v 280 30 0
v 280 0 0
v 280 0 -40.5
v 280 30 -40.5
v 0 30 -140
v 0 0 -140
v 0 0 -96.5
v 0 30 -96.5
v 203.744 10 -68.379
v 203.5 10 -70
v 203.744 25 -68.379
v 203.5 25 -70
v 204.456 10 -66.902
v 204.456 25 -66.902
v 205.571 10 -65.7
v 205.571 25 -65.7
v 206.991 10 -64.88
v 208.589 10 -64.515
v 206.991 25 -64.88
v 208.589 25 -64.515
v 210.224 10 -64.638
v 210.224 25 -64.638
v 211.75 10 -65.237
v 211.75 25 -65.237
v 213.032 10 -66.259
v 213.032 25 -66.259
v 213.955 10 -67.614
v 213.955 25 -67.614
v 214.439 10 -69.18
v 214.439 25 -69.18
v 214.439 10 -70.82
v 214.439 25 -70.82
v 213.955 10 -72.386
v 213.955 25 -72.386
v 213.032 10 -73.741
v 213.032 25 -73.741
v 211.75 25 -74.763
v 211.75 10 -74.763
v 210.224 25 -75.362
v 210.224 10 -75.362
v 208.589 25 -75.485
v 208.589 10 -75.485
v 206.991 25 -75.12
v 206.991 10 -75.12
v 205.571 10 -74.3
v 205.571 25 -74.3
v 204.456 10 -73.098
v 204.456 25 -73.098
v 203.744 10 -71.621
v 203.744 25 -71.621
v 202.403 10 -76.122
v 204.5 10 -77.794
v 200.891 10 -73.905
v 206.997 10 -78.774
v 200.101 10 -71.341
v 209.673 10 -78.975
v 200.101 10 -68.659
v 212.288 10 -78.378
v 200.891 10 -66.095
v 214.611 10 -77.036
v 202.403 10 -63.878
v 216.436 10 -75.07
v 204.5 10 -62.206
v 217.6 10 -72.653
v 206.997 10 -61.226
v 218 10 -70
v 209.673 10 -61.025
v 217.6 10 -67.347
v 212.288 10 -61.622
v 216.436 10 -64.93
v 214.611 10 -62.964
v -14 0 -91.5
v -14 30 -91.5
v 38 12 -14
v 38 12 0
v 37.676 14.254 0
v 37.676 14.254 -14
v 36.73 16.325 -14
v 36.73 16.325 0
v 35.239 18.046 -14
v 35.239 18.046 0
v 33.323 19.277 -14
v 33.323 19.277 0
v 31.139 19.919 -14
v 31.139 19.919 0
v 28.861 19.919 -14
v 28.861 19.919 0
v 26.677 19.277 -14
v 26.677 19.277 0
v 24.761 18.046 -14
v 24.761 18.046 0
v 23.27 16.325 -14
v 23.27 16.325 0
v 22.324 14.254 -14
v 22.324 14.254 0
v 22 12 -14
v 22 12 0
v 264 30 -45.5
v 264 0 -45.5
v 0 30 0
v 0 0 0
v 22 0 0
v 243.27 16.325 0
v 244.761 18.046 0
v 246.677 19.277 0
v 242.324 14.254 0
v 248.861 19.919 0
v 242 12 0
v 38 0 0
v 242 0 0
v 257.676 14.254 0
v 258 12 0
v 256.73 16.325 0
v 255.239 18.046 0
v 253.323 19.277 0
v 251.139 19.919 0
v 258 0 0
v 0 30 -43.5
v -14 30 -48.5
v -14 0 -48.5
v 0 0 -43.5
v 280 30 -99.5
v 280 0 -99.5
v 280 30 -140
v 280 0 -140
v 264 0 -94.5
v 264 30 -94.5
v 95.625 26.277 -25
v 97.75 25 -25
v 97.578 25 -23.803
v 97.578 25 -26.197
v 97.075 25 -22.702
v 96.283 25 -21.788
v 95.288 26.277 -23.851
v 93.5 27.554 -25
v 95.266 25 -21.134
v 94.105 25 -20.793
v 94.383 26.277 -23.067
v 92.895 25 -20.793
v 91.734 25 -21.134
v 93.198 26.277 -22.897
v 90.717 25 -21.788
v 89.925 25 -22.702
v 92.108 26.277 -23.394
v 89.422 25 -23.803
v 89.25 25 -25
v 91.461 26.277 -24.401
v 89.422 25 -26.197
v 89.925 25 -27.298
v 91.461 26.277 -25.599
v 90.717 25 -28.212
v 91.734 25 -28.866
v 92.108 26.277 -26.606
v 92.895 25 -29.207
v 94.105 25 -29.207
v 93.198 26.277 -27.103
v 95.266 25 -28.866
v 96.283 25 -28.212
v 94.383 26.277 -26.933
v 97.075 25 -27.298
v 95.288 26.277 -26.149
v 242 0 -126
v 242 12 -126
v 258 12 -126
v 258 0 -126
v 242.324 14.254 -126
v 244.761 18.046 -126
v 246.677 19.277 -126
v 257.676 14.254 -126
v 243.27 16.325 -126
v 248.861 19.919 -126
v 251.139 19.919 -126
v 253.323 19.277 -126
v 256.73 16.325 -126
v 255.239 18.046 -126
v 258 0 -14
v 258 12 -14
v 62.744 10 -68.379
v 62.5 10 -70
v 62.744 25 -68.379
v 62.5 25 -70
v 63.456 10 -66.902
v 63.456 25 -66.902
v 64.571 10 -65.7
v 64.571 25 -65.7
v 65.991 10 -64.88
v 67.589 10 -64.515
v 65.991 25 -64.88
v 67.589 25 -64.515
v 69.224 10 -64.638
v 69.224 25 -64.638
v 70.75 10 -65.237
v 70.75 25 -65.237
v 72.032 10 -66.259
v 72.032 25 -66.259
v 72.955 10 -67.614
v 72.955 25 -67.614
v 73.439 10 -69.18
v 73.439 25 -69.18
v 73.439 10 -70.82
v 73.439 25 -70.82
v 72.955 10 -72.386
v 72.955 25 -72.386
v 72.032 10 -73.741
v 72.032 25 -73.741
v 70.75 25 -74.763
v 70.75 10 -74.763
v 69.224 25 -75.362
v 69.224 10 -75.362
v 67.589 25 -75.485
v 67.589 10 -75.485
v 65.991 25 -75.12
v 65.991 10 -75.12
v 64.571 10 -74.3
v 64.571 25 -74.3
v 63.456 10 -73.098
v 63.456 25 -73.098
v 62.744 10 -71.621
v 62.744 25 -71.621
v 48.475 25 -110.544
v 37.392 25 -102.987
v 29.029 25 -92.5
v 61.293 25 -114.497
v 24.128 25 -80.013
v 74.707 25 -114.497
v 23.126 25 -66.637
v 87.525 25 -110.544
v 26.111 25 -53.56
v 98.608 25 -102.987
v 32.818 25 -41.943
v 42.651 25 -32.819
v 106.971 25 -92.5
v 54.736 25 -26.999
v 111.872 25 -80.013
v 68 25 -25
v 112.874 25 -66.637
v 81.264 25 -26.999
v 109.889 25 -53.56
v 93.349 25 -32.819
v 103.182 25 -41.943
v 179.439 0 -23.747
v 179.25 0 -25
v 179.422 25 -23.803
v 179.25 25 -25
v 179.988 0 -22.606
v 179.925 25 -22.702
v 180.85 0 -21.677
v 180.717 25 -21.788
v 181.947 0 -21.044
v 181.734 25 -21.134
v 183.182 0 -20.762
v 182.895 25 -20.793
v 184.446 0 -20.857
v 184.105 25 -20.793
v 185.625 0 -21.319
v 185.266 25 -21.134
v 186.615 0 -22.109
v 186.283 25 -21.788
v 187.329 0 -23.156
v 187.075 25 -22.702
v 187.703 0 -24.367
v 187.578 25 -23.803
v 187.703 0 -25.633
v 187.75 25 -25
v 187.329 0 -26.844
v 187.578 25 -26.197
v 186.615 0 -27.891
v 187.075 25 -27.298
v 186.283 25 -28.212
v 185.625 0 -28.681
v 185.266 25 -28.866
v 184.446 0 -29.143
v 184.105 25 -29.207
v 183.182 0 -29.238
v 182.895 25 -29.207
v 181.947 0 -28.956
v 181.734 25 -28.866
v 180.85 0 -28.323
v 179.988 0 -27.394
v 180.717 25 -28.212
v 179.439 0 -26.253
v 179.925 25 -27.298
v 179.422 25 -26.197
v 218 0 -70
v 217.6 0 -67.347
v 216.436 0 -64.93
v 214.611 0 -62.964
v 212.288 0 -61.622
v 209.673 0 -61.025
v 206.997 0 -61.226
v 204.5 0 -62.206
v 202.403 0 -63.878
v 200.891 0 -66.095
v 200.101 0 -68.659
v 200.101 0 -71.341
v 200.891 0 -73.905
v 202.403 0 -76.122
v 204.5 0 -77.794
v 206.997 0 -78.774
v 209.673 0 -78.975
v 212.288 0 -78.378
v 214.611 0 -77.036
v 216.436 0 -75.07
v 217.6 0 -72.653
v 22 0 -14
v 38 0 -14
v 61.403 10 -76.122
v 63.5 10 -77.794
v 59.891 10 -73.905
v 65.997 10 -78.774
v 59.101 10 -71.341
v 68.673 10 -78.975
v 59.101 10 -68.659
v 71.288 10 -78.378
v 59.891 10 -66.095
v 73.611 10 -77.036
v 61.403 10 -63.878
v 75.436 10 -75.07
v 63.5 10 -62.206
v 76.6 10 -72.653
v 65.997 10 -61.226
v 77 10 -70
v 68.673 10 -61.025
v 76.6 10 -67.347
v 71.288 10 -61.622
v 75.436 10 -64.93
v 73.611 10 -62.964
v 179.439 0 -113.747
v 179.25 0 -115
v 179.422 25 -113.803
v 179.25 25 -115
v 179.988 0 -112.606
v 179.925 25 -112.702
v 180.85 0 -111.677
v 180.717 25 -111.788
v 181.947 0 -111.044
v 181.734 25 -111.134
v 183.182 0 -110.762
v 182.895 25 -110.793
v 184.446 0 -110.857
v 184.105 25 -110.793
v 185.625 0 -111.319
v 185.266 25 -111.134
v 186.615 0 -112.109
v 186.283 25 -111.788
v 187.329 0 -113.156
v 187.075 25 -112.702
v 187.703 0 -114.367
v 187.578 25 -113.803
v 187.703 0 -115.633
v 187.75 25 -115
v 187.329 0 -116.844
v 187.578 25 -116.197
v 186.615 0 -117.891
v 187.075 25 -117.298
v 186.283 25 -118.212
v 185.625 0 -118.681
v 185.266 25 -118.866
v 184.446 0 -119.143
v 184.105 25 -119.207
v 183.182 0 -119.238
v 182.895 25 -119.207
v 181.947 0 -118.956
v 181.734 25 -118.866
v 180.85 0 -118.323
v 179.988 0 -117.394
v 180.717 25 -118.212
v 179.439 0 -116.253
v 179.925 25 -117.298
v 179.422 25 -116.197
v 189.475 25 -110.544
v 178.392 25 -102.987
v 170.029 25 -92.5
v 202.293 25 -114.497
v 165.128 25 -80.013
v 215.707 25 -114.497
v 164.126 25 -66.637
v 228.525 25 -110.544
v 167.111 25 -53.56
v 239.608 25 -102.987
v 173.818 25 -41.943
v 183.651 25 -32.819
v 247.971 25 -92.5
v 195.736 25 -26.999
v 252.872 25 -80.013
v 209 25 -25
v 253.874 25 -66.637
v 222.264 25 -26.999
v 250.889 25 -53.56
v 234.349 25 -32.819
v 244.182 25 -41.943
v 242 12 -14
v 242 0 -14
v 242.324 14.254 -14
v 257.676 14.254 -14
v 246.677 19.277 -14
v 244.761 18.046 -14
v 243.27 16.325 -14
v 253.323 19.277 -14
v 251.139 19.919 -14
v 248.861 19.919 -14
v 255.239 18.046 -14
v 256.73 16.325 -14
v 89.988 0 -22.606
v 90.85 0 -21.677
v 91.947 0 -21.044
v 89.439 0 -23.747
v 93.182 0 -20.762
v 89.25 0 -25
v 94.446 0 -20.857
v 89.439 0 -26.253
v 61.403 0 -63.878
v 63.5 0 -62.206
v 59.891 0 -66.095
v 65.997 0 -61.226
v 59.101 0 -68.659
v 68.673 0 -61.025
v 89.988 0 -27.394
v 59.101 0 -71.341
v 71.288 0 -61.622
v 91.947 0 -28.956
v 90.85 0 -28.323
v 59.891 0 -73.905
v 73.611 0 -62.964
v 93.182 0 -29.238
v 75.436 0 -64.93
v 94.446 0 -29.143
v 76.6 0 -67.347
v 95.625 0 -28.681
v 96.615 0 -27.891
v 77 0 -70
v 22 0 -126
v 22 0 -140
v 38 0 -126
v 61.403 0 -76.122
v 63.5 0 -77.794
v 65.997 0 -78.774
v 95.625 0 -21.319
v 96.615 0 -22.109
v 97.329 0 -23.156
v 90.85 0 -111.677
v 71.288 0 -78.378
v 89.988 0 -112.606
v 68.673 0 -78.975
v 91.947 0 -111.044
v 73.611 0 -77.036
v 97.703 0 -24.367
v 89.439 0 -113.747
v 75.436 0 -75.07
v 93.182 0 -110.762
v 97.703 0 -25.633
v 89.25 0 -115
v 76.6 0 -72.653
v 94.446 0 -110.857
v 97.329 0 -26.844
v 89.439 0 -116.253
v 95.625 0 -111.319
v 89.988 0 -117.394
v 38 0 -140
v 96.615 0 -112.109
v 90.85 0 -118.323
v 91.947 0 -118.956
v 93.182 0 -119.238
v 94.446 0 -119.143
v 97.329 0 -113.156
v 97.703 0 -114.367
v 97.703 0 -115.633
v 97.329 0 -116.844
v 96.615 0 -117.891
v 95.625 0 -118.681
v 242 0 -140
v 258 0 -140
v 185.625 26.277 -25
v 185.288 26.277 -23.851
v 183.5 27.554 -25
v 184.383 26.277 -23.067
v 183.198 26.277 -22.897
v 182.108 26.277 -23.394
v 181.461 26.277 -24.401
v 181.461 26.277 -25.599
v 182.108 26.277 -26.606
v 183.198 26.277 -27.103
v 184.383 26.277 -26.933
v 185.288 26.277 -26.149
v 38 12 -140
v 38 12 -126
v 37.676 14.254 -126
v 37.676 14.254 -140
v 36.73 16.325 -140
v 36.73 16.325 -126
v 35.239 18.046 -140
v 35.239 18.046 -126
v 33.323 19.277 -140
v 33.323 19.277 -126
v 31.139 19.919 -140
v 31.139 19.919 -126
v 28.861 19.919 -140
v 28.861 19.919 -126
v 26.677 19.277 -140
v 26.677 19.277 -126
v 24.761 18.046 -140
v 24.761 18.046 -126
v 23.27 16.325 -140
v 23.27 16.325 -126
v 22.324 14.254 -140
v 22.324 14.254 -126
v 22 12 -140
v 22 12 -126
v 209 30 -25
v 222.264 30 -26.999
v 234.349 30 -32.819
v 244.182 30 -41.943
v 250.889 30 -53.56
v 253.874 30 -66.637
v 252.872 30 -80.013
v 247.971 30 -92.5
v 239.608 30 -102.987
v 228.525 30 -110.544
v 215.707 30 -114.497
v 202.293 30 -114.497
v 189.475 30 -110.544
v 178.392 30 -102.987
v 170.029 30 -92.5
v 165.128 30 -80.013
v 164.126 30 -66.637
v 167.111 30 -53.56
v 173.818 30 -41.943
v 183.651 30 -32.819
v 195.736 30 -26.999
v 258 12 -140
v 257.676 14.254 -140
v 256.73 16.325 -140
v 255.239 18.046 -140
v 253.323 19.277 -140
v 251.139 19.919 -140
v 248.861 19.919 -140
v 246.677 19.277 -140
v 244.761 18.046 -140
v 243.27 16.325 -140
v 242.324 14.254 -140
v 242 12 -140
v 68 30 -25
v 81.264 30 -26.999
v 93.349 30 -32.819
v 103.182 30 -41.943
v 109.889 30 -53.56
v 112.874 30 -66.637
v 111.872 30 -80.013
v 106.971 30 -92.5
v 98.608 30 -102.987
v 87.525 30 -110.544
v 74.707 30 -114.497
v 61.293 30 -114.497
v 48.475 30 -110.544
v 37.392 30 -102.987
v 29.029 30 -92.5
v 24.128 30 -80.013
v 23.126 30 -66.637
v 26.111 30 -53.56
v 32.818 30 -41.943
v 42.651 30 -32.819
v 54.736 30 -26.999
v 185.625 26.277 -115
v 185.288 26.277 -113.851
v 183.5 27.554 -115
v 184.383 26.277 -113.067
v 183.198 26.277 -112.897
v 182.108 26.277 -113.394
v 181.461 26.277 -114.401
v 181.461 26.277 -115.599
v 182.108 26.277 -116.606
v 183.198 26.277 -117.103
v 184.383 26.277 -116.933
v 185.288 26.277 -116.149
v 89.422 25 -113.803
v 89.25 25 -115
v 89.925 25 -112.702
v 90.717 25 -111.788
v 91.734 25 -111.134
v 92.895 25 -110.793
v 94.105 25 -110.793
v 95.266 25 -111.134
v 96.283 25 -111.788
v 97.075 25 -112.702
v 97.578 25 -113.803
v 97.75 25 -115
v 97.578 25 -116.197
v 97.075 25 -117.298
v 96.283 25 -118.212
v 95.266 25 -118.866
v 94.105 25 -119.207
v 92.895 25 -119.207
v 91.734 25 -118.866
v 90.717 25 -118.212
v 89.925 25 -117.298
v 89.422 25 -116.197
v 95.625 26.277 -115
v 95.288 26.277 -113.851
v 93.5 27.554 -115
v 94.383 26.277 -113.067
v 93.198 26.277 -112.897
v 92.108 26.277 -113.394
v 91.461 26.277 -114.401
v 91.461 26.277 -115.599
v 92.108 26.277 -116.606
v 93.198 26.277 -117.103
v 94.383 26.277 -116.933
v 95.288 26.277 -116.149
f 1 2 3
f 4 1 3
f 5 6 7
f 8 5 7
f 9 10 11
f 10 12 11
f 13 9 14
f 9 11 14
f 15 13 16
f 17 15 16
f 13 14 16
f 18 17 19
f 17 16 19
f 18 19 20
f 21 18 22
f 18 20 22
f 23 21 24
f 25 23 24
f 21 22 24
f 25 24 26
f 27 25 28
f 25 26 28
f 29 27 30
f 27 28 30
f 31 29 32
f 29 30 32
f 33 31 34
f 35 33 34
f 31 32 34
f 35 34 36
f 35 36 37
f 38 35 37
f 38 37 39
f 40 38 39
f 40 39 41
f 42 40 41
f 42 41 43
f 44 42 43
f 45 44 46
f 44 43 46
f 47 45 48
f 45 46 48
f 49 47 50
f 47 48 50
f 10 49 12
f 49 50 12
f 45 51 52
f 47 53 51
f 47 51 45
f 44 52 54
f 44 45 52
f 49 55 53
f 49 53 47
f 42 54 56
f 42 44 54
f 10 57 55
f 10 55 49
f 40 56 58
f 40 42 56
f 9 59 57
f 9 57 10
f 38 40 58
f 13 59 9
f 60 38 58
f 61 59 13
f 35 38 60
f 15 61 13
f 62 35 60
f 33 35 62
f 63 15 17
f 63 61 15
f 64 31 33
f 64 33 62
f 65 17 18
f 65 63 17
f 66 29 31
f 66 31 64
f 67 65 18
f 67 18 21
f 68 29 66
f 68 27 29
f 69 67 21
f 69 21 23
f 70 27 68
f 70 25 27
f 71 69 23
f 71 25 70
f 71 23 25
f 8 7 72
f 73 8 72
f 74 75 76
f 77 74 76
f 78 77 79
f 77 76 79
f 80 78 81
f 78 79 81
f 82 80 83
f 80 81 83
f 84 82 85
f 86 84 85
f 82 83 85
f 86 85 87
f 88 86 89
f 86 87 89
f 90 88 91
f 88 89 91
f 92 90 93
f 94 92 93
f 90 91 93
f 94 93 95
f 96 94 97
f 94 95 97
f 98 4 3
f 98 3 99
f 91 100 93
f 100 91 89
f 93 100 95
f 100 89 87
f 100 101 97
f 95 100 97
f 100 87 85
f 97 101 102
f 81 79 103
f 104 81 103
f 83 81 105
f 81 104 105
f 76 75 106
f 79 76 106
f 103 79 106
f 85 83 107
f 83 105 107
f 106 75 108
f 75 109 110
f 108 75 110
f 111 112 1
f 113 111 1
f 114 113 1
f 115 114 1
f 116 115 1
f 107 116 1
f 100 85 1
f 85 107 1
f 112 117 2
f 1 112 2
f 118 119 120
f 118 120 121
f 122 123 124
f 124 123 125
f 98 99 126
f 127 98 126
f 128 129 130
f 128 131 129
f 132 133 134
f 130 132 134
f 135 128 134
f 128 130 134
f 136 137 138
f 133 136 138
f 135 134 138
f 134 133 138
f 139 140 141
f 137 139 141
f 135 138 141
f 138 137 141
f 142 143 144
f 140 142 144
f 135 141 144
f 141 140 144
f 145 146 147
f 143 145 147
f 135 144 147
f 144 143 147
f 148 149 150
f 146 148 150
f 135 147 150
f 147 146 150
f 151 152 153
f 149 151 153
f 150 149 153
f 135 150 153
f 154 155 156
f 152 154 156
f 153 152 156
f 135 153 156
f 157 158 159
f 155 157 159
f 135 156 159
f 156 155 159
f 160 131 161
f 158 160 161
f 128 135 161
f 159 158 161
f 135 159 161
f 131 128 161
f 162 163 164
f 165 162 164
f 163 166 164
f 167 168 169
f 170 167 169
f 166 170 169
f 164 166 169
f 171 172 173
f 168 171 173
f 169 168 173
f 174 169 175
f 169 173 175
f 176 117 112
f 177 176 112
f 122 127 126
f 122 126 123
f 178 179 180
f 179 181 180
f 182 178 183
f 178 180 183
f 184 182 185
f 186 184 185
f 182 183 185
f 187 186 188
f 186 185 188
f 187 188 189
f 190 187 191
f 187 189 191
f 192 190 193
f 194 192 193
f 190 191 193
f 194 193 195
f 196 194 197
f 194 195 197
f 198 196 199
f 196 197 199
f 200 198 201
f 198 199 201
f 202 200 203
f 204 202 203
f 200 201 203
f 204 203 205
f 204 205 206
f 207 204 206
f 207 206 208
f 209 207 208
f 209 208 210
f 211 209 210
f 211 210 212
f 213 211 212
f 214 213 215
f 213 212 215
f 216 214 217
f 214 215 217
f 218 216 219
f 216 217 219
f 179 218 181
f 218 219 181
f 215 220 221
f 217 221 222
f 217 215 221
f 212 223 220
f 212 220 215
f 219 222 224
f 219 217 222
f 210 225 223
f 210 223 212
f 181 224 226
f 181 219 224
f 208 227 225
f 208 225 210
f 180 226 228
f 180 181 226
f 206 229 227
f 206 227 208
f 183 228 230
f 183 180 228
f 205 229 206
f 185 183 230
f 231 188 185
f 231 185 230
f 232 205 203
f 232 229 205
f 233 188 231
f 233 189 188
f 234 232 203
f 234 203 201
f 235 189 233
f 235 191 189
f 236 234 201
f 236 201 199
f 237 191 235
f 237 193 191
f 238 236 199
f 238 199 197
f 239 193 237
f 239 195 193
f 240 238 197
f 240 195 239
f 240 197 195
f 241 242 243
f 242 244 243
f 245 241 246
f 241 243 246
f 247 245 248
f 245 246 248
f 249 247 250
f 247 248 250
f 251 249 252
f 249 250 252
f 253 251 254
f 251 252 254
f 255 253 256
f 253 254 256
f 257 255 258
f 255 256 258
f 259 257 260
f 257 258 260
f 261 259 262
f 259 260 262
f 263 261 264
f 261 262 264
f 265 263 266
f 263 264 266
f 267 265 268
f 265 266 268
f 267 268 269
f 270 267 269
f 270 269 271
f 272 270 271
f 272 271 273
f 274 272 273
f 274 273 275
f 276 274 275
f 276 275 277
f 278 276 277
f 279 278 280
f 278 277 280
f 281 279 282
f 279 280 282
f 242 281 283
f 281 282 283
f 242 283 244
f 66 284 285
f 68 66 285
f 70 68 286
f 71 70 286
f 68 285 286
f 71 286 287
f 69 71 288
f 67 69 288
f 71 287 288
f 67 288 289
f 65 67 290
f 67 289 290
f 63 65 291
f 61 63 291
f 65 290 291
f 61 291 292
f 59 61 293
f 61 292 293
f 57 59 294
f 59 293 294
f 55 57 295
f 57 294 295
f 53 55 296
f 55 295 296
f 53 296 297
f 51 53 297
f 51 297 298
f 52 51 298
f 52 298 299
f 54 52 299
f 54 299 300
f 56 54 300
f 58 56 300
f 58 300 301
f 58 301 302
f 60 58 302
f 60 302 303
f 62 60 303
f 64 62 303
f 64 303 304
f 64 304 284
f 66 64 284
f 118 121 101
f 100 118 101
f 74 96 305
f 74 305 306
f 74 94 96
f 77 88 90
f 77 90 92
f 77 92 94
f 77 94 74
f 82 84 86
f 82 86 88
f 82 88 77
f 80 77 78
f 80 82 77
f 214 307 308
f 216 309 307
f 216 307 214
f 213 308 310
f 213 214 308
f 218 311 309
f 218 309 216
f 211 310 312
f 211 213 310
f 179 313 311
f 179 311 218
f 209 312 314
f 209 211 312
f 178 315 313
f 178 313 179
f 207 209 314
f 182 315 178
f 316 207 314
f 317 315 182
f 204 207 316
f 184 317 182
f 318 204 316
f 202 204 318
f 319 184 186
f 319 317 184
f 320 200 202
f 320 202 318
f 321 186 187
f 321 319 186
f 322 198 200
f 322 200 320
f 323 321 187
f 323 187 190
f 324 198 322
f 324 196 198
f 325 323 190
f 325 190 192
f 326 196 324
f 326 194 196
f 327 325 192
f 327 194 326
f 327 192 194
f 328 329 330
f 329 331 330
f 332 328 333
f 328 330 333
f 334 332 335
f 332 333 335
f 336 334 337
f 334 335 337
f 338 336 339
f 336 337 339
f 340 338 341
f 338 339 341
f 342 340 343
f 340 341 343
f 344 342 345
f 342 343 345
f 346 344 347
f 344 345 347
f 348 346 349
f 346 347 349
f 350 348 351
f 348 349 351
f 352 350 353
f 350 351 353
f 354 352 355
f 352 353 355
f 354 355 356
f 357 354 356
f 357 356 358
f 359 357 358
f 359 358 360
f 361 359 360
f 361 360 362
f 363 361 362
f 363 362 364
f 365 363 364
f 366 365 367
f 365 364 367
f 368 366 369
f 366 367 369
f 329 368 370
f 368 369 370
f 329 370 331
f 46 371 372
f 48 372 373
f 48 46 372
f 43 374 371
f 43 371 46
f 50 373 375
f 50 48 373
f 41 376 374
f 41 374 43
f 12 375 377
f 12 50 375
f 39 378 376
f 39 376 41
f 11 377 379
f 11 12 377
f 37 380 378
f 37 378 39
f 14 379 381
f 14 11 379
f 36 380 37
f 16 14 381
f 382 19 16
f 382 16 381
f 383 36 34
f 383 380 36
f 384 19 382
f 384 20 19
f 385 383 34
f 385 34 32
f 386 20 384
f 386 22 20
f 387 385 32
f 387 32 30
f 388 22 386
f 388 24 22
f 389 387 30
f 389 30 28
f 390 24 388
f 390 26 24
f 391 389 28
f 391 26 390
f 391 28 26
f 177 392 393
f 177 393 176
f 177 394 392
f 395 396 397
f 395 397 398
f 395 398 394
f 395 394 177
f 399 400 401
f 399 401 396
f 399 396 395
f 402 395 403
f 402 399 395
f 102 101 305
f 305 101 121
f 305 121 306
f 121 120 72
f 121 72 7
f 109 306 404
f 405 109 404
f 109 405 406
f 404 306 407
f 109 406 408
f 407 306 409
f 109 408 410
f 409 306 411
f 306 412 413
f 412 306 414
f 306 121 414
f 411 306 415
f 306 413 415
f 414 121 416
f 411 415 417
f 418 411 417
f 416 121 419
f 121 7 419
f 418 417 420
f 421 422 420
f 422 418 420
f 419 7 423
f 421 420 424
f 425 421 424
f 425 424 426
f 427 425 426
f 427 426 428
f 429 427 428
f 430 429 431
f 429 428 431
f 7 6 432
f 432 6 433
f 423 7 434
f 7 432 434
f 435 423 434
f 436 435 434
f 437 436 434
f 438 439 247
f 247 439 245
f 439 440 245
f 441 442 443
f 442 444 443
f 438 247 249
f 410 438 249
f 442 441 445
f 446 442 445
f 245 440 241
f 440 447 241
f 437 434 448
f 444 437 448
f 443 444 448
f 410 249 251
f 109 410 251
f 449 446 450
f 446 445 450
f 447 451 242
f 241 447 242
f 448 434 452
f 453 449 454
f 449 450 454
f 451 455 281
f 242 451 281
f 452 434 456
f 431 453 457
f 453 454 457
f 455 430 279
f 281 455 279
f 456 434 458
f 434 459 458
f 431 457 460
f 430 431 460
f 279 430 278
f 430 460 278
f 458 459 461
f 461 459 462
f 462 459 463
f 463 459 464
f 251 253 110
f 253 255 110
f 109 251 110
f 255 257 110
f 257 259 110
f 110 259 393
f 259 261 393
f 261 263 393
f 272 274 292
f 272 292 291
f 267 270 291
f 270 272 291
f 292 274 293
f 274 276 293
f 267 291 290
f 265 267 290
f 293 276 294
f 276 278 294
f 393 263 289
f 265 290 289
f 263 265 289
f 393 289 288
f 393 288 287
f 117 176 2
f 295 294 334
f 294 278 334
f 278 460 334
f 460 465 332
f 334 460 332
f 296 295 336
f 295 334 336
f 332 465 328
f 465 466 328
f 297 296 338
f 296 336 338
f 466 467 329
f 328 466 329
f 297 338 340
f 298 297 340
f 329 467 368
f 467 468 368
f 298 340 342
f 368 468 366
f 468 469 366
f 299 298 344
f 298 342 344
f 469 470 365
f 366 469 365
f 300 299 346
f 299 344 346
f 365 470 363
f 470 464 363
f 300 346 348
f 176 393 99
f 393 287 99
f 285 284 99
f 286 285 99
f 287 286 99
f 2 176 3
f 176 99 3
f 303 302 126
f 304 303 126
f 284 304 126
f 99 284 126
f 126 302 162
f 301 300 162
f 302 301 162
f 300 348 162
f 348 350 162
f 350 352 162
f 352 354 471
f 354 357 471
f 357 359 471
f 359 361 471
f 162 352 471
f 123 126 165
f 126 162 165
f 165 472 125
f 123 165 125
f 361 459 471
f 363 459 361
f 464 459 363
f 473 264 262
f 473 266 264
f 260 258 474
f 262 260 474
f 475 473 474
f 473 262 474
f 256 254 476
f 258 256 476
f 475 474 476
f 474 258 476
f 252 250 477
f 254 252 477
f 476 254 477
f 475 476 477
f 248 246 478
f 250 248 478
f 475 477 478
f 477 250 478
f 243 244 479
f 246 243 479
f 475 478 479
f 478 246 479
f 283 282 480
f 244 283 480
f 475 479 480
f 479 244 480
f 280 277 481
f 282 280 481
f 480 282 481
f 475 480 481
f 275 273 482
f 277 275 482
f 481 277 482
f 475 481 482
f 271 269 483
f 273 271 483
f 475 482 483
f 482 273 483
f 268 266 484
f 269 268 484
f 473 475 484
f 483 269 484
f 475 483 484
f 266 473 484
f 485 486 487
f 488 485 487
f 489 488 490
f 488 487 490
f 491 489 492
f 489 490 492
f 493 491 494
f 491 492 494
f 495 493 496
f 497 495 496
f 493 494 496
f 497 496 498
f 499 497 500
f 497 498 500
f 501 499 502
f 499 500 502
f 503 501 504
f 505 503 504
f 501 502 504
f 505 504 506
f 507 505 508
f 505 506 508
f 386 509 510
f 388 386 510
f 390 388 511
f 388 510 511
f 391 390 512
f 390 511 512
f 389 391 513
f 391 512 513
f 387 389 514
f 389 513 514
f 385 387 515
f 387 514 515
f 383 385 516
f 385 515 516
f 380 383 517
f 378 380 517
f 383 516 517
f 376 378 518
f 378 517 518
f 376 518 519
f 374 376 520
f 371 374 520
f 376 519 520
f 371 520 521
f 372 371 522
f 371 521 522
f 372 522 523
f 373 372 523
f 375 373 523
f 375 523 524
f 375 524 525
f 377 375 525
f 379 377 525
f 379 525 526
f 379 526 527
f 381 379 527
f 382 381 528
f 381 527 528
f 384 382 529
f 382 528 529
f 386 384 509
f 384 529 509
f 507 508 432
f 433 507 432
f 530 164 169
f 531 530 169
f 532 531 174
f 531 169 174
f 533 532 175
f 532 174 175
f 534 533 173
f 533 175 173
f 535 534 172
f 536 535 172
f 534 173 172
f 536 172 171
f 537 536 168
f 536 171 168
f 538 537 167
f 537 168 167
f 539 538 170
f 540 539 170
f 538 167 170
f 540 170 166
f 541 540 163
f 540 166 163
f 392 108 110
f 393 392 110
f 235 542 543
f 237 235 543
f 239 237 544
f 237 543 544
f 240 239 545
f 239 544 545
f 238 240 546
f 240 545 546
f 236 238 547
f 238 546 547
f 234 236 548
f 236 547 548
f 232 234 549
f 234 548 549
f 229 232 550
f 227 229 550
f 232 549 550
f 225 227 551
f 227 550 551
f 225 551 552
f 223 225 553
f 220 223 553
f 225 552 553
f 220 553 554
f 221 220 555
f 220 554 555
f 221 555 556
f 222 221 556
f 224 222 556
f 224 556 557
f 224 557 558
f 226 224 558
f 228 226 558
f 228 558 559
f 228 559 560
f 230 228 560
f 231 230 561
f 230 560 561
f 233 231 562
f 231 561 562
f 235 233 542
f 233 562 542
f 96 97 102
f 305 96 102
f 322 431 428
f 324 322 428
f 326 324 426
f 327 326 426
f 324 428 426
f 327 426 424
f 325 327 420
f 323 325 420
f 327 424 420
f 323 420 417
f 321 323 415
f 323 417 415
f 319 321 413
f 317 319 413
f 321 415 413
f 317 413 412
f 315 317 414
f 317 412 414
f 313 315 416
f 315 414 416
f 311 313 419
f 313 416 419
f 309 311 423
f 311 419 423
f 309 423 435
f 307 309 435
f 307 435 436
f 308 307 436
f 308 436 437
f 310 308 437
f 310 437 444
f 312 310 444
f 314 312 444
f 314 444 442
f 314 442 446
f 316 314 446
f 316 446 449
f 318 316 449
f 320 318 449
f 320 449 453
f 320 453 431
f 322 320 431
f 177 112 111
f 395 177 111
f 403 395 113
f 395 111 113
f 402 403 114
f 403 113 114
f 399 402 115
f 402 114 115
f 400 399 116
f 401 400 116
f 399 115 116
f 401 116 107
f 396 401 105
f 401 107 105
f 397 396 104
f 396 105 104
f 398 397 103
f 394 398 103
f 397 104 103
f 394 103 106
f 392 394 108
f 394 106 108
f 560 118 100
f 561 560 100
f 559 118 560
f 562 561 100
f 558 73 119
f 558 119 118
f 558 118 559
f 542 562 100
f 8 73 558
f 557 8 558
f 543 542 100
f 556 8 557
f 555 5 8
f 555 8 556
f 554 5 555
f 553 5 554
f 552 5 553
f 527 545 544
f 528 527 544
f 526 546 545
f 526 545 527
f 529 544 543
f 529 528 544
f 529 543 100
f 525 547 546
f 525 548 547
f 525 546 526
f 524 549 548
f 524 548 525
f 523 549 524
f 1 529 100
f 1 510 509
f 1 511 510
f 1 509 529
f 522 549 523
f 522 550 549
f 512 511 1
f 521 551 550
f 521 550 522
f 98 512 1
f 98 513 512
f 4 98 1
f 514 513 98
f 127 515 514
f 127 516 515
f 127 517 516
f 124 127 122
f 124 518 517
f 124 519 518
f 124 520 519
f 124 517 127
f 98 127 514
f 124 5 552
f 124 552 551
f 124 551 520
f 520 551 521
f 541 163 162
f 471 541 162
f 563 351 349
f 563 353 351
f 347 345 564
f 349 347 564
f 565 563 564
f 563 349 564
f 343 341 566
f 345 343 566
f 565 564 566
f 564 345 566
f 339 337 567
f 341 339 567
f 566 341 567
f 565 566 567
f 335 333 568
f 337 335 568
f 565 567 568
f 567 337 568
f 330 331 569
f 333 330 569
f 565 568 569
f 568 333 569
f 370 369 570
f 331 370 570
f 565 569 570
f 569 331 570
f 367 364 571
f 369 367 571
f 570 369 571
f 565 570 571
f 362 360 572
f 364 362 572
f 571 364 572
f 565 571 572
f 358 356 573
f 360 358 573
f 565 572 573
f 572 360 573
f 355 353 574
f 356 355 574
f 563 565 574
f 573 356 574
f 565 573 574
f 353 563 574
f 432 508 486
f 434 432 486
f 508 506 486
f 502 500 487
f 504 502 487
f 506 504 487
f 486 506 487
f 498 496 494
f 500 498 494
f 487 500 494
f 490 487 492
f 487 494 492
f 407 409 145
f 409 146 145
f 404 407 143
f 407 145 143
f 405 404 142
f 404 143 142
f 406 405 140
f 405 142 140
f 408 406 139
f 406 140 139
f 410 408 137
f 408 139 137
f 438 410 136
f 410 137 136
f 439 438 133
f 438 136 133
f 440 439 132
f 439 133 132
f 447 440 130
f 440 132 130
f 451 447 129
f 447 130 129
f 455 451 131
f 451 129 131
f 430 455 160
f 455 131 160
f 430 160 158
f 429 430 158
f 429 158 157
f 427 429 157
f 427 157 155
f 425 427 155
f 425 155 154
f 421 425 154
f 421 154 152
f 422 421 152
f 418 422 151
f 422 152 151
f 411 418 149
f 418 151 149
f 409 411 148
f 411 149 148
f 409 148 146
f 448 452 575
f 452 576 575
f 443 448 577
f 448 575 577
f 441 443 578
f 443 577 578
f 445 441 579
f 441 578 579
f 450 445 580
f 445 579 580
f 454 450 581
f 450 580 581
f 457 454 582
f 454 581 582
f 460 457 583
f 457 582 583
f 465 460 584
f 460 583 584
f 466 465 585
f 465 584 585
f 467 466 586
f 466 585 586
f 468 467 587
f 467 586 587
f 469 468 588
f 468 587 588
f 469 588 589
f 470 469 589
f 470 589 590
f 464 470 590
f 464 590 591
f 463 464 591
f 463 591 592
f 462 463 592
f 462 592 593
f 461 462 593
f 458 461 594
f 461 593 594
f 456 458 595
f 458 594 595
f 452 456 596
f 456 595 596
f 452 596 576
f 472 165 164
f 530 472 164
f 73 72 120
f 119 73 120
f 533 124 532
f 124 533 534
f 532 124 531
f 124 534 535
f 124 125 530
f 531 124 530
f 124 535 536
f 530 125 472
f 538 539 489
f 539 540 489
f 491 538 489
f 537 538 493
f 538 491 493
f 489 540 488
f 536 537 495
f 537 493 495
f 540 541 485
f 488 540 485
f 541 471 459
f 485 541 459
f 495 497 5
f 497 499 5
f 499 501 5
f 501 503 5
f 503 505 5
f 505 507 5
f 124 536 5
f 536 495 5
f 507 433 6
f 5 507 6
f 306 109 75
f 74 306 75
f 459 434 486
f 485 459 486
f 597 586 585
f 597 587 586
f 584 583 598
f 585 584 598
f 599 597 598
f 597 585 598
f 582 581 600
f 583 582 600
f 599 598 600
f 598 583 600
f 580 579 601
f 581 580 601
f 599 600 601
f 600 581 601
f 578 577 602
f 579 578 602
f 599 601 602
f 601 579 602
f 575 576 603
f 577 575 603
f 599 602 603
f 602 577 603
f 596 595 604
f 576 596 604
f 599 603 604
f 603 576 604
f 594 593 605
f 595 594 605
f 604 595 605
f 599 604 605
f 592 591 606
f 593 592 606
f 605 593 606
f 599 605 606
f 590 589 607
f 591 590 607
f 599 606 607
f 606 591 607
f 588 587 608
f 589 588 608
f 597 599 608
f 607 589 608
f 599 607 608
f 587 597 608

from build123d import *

# Parameters (mm, degrees)
ESTRUSIONE1_DEPTH                                    = 30
ESTRUSIONE2_DEPTH                                    = 14
RIPETIZIONE_A_L1_COUNT                               = 2
RIPETIZIONE_A_L1_PITCH                               = 220
RIPETIZIONE_A_L1_COUNT_DIR2                          = 2
RIPETIZIONE_A_L1_PITCH_DIR2                          = 126
SCHIZZO3_R                                           = 45
ESTRUSIONE3_DEPTH                                    = 5
M10_LAMATURA_PER_VITE_A_COPERTURA_CILIND_D           = 11
M10_LAMATURA_PER_VITE_A_COPERTURA_CILIND_CBORE_D     = 18
M10_LAMATURA_PER_VITE_A_COPERTURA_CILIND_CBORE_DEPTH = 10
M10_TAPPED_HOLE1_D                                   = 8.5
M10_TAPPED_HOLE1_DEPTH                               = 25
M10_TAPPED_HOLE1_TIP                                 = 2.553657631


with BuildPart() as part:
    # Schizzo1 → Estrusione1 (new body)
    with BuildSketch(Plane(origin=(0, 0, 0), x_dir=(1, 0, 0), z_dir=(0, 1, 0))):
        Polygon((-14, 91.5), (-14, 48.5), (0, 43.5), (0, 0), (280, 0), (280, 40.5), (264, 45.5), (264, 94.5), (280, 99.5), (280, 140), (0, 140), (0, 96.5), align=None)
    extrude(amount=ESTRUSIONE1_DEPTH)

    # Schizzo2 → Estrusione2 (cut)
    with BuildSketch(Plane.XY):
        with BuildLine():
            Line((22, 12), (22, 0))
            Line((22, 0), (38, 0))
            Line((38, 0), (38, 12))
            ThreePointArc((38, 12), (30, 20), (22, 12))
        make_face()
    estrusione2 = extrude(amount=-ESTRUSIONE2_DEPTH, mode=Mode.SUBTRACT)

    # Ripetizione a L1: Estrusione2 2 × 2
    with Locations(*[(i * RIPETIZIONE_A_L1_PITCH, 0, -j * RIPETIZIONE_A_L1_PITCH_DIR2) for i in range(RIPETIZIONE_A_L1_COUNT) for j in range(RIPETIZIONE_A_L1_COUNT_DIR2) if (i, j) != (0, 0)]):
        add(estrusione2, mode=Mode.SUBTRACT)

    # Schizzo3 → Estrusione3 (cut)
    with BuildSketch(Plane(origin=(0, 30, 0), x_dir=(1, 0, 0), z_dir=(0, 1, 0))):
        with Locations(Location((68, 70, 0), (0, 0, 270))):
            Circle(SCHIZZO3_R)
        with Locations(Location((209, 70, 0), (0, 0, 270))):
            Circle(SCHIZZO3_R)
    extrude(amount=-ESTRUSIONE3_DEPTH, mode=Mode.SUBTRACT)

    # M10 Lamatura per vite a copertura cilindrica esagonale2 (through all)
    with Locations(Plane.XZ):
        with Locations((68, -70), (209, -70)):
            CounterBoreHole(M10_LAMATURA_PER_VITE_A_COPERTURA_CILIND_D / 2, M10_LAMATURA_PER_VITE_A_COPERTURA_CILIND_CBORE_D / 2, M10_LAMATURA_PER_VITE_A_COPERTURA_CILIND_CBORE_DEPTH)

    # M10 Tapped Hole1
    with Locations(Plane.XZ):
        with Locations((93.5, -25), (183.5, -25), (93.5, -115), (183.5, -115)):
            Hole(M10_TAPPED_HOLE1_D / 2, depth=M10_TAPPED_HOLE1_DEPTH)
            with Locations((0, 0, -(M10_TAPPED_HOLE1_DEPTH + M10_TAPPED_HOLE1_TIP / 2))):  # 118° drill point
                Cone(0, M10_TAPPED_HOLE1_D / 2, M10_TAPPED_HOLE1_TIP, mode=Mode.SUBTRACT)


solid = part.part
